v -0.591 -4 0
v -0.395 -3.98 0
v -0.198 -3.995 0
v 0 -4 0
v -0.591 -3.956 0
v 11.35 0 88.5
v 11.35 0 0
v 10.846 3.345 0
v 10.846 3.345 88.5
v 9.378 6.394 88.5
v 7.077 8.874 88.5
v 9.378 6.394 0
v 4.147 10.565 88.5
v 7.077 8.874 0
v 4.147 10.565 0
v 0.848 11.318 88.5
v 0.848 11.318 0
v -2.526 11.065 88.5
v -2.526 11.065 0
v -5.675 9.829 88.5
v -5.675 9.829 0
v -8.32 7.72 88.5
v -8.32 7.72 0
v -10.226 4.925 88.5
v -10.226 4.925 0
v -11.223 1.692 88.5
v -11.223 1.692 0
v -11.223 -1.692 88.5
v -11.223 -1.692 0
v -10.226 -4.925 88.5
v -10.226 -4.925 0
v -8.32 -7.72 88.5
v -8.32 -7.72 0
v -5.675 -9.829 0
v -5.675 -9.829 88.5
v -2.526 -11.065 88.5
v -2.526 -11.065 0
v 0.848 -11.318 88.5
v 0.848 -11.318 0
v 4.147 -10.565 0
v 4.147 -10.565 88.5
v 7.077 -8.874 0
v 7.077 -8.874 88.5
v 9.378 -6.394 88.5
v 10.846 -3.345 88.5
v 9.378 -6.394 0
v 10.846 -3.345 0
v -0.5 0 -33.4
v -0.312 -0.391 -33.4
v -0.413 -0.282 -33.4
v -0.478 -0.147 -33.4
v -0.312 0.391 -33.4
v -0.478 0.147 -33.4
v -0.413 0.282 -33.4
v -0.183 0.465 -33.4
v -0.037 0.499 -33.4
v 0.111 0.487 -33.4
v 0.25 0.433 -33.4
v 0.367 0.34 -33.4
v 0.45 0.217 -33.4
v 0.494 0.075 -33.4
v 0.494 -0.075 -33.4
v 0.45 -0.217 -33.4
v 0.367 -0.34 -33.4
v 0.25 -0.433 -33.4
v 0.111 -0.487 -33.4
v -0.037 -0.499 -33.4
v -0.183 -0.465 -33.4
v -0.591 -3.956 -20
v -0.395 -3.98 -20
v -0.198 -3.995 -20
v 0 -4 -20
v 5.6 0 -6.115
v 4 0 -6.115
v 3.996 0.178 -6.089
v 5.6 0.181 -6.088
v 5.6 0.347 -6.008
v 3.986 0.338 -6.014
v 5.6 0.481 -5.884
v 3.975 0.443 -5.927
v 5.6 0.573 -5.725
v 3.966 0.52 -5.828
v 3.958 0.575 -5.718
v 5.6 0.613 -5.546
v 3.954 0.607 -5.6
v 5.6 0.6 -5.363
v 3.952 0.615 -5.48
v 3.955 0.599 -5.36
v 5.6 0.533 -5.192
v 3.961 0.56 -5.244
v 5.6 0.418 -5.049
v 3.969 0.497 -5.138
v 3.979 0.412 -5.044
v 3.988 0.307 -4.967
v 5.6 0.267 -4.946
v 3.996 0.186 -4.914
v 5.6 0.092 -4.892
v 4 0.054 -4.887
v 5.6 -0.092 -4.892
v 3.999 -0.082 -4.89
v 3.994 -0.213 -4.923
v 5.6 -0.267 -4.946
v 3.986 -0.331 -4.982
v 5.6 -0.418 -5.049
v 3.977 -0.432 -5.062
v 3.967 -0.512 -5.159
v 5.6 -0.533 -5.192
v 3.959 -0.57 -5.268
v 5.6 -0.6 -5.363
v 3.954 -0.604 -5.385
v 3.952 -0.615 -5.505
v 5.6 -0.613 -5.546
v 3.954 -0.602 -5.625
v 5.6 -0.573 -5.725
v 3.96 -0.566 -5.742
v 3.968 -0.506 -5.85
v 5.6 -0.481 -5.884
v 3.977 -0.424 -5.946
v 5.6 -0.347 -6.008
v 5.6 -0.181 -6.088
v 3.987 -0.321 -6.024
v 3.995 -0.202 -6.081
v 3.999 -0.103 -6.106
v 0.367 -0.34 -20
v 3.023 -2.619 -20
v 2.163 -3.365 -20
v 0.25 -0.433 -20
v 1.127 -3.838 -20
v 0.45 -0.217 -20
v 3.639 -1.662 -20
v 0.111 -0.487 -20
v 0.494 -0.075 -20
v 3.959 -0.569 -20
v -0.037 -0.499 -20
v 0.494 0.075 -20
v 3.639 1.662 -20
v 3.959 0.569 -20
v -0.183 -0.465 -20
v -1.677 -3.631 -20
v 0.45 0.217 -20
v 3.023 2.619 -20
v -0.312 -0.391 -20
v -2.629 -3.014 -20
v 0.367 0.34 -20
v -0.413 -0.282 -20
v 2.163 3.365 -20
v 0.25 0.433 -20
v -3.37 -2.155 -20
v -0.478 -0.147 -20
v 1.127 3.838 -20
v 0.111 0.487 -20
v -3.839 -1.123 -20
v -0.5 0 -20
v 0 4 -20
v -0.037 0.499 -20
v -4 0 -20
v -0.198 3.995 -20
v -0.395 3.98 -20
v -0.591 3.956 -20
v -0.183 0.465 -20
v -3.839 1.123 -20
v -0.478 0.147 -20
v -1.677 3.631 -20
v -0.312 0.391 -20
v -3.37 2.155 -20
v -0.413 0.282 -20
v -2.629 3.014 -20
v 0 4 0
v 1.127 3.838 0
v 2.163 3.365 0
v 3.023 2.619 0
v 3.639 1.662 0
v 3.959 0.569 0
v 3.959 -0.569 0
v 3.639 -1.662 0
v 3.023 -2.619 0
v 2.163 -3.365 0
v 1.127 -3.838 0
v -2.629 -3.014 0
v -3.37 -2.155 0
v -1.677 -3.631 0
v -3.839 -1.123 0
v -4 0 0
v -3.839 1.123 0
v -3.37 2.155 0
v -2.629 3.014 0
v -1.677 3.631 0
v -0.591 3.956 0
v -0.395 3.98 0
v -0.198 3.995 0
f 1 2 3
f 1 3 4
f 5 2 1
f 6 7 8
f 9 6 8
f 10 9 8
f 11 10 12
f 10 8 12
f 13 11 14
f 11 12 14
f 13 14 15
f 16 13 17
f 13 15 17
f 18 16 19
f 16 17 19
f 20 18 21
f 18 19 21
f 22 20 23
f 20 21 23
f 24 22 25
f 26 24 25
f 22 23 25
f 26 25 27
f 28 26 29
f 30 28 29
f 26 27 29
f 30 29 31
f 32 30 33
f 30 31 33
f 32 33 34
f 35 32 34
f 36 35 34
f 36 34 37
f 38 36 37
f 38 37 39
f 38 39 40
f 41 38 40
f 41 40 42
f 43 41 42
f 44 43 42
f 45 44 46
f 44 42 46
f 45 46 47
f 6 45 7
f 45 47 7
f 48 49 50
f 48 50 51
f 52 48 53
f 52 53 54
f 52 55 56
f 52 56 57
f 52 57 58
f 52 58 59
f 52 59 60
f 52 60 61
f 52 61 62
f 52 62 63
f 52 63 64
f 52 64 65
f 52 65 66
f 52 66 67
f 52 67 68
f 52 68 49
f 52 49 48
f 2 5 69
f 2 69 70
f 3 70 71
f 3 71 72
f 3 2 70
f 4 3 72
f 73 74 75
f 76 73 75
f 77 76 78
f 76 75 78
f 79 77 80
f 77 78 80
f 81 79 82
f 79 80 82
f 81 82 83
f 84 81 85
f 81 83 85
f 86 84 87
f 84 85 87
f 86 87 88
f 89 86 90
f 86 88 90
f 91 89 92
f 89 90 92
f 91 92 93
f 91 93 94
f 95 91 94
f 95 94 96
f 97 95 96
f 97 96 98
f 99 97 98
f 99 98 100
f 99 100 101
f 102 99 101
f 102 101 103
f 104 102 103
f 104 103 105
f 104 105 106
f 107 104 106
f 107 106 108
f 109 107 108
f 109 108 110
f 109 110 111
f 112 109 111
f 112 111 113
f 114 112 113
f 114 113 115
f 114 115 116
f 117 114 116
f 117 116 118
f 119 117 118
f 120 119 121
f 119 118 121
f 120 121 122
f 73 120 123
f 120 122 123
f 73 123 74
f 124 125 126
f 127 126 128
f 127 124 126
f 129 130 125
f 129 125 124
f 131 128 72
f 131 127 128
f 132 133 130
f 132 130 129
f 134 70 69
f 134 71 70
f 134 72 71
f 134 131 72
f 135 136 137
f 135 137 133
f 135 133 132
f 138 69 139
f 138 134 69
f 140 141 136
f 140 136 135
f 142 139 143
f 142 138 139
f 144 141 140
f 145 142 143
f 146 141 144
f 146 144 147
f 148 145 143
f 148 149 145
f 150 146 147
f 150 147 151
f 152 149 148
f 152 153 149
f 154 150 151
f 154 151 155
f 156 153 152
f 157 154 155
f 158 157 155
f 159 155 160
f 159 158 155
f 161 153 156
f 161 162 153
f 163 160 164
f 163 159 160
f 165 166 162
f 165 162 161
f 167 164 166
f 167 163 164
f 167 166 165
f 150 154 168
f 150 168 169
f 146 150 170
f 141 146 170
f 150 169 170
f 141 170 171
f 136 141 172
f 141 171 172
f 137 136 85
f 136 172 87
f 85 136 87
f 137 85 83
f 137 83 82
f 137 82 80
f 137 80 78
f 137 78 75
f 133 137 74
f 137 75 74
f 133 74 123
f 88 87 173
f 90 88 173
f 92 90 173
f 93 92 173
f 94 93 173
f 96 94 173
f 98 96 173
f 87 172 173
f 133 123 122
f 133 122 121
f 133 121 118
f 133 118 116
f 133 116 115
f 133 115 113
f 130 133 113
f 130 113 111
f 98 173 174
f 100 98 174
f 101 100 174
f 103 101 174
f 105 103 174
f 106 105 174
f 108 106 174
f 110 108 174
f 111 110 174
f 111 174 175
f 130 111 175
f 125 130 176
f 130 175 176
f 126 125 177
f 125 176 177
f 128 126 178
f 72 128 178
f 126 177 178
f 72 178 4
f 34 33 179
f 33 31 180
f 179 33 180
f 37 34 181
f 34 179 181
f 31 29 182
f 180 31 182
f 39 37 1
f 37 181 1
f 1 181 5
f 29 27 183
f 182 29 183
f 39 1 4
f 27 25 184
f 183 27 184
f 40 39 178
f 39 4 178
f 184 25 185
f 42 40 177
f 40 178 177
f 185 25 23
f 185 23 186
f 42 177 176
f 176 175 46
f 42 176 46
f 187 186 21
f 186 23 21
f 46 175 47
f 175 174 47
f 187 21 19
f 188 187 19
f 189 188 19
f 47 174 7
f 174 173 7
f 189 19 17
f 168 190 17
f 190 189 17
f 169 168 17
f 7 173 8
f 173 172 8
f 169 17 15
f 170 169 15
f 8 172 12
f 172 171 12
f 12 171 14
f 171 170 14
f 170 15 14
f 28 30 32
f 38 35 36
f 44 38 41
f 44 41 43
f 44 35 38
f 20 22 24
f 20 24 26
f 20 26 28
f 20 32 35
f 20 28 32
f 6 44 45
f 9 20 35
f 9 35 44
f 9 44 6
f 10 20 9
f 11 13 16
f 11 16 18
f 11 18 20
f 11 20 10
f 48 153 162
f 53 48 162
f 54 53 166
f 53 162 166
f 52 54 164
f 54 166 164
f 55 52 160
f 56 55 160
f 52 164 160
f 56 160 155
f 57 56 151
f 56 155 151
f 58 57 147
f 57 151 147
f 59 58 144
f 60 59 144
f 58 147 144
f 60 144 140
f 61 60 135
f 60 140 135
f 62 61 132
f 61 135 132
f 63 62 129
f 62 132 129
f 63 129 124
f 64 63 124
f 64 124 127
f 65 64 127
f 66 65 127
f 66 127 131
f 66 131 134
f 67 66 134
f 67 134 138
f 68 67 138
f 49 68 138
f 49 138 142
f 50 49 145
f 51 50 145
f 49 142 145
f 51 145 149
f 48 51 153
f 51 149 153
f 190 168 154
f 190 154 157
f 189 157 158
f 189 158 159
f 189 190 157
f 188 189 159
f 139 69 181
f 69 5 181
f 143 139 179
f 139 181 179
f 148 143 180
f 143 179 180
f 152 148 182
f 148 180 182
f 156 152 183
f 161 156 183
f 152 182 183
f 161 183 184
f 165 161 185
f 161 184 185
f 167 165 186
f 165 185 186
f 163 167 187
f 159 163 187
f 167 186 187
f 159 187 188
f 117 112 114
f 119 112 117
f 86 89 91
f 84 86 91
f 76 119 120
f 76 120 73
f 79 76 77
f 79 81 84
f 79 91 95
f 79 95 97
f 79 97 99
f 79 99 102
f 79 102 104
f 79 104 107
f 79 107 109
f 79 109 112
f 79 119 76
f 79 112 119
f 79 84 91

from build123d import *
from build123d.topology import SkipClean

# Parameters (mm, degrees)
ESQUISSE1_R             = 11.35
BOSS_EXTRU_1_DEPTH      = 88.5
ESQUISSE2_R             = 4
BOSS_EXTRU_2_DEPTH      = 20
ESQUISSE4_W             = 0.590657656
ESQUISSE4_H             = 10.980800687
BOSS_EXTRU_3_DEPTH      = 20
ESQUISSE5_R             = 0.615112373
BOSS_EXTRU_4_DEPTH      = 5.6
ENL_V_START             = -20
ENL_V_MAT_EXTRU_2_DEPTH = 20
ENL_V_MAT_EXTRU_3_DEPTH = 20
SKETCH1_R               = 0.5
BOSS_EXTRUDE1_DEPTH     = 13.4


with BuildPart() as part:
    # Esquisse1 → Boss.-Extru.1 (new body)
    with BuildSketch(Plane.XY):
        Circle(ESQUISSE1_R)
    extrude(amount=BOSS_EXTRU_1_DEPTH)

    # Esquisse2 → Boss.-Extru.2 (add)
    with BuildSketch(Plane(origin=(0, 0, 0), x_dir=(-1, 0, 0), z_dir=(0, 0, -1))):
        Circle(ESQUISSE2_R)
    extrude(amount=BOSS_EXTRU_2_DEPTH)

    # Esquisse4 → Boss.-Extru.3 (add)
    with BuildSketch(Plane(origin=(0, 0, 0), x_dir=(-1, 0, 0), z_dir=(0, 0, -1))):
        with Locations((0.295328828, 1.490400344)):
            Rectangle(ESQUISSE4_W, ESQUISSE4_H)
    extrude(amount=BOSS_EXTRU_3_DEPTH)

    # Esquisse5 → Boss.-Extru.4 (add)
    with BuildSketch(Plane(origin=(0, 0, 0), x_dir=(0, 0, -1), z_dir=(1, 0, 0))):
        with Locations((5.5, 0)):
            Circle(ESQUISSE5_R)
    extrude(amount=BOSS_EXTRU_4_DEPTH)

    # Esquisse7 → Enlèv. mat.-Extru.2 (cut)
    with BuildSketch(Plane(origin=(0, 0, -20), x_dir=(-1, 0, 0), z_dir=(0, 0, -1)).offset(ENL_V_START)):
        with BuildLine():
            Line((0.590657656, 6.980800687), (0, 6.980800687))
            Line((0, 6.980800687), (0, 4))
            ThreePointArc((0, 4), (0.296141555, 3.989022459), (0.590657656, 3.95615009))
            Line((0.590657656, 3.95615009), (0.590657656, 6.980800687))
        make_face()
    extrude(amount=ENL_V_MAT_EXTRU_2_DEPTH, mode=Mode.SUBTRACT)

    # Esquisse8 → Enlèv. mat.-Extru.3 (cut)
    with SkipClean():  # the faces are left unmerged after this step: merging them gives an invalid solid
        with BuildSketch(Plane(origin=(0, 0, -20), x_dir=(-1, 0, 0), z_dir=(0, 0, -1)).offset(ENL_V_START)):
            with BuildLine():
                ThreePointArc((0.590657656, -3.95615009), (0.296141555, -3.989022459), (0, -4))
                Line((0, -4), (0.590657656, -4))
                Line((0.590657656, -4), (0.590657656, -3.95615009))
            make_face()
        extrude(amount=ENL_V_MAT_EXTRU_3_DEPTH, mode=Mode.SUBTRACT)

    # Sketch1 → Boss-Extrude1 (add)
    with SkipClean():  # the faces are left unmerged after this step: merging them gives an invalid solid
        with BuildSketch(Plane(origin=(0, 0, -20), x_dir=(-1, 0, 0), z_dir=(0, 0, -1))):
            Circle(SKETCH1_R)
        extrude(amount=BOSS_EXTRUDE1_DEPTH)


solid = part.part
